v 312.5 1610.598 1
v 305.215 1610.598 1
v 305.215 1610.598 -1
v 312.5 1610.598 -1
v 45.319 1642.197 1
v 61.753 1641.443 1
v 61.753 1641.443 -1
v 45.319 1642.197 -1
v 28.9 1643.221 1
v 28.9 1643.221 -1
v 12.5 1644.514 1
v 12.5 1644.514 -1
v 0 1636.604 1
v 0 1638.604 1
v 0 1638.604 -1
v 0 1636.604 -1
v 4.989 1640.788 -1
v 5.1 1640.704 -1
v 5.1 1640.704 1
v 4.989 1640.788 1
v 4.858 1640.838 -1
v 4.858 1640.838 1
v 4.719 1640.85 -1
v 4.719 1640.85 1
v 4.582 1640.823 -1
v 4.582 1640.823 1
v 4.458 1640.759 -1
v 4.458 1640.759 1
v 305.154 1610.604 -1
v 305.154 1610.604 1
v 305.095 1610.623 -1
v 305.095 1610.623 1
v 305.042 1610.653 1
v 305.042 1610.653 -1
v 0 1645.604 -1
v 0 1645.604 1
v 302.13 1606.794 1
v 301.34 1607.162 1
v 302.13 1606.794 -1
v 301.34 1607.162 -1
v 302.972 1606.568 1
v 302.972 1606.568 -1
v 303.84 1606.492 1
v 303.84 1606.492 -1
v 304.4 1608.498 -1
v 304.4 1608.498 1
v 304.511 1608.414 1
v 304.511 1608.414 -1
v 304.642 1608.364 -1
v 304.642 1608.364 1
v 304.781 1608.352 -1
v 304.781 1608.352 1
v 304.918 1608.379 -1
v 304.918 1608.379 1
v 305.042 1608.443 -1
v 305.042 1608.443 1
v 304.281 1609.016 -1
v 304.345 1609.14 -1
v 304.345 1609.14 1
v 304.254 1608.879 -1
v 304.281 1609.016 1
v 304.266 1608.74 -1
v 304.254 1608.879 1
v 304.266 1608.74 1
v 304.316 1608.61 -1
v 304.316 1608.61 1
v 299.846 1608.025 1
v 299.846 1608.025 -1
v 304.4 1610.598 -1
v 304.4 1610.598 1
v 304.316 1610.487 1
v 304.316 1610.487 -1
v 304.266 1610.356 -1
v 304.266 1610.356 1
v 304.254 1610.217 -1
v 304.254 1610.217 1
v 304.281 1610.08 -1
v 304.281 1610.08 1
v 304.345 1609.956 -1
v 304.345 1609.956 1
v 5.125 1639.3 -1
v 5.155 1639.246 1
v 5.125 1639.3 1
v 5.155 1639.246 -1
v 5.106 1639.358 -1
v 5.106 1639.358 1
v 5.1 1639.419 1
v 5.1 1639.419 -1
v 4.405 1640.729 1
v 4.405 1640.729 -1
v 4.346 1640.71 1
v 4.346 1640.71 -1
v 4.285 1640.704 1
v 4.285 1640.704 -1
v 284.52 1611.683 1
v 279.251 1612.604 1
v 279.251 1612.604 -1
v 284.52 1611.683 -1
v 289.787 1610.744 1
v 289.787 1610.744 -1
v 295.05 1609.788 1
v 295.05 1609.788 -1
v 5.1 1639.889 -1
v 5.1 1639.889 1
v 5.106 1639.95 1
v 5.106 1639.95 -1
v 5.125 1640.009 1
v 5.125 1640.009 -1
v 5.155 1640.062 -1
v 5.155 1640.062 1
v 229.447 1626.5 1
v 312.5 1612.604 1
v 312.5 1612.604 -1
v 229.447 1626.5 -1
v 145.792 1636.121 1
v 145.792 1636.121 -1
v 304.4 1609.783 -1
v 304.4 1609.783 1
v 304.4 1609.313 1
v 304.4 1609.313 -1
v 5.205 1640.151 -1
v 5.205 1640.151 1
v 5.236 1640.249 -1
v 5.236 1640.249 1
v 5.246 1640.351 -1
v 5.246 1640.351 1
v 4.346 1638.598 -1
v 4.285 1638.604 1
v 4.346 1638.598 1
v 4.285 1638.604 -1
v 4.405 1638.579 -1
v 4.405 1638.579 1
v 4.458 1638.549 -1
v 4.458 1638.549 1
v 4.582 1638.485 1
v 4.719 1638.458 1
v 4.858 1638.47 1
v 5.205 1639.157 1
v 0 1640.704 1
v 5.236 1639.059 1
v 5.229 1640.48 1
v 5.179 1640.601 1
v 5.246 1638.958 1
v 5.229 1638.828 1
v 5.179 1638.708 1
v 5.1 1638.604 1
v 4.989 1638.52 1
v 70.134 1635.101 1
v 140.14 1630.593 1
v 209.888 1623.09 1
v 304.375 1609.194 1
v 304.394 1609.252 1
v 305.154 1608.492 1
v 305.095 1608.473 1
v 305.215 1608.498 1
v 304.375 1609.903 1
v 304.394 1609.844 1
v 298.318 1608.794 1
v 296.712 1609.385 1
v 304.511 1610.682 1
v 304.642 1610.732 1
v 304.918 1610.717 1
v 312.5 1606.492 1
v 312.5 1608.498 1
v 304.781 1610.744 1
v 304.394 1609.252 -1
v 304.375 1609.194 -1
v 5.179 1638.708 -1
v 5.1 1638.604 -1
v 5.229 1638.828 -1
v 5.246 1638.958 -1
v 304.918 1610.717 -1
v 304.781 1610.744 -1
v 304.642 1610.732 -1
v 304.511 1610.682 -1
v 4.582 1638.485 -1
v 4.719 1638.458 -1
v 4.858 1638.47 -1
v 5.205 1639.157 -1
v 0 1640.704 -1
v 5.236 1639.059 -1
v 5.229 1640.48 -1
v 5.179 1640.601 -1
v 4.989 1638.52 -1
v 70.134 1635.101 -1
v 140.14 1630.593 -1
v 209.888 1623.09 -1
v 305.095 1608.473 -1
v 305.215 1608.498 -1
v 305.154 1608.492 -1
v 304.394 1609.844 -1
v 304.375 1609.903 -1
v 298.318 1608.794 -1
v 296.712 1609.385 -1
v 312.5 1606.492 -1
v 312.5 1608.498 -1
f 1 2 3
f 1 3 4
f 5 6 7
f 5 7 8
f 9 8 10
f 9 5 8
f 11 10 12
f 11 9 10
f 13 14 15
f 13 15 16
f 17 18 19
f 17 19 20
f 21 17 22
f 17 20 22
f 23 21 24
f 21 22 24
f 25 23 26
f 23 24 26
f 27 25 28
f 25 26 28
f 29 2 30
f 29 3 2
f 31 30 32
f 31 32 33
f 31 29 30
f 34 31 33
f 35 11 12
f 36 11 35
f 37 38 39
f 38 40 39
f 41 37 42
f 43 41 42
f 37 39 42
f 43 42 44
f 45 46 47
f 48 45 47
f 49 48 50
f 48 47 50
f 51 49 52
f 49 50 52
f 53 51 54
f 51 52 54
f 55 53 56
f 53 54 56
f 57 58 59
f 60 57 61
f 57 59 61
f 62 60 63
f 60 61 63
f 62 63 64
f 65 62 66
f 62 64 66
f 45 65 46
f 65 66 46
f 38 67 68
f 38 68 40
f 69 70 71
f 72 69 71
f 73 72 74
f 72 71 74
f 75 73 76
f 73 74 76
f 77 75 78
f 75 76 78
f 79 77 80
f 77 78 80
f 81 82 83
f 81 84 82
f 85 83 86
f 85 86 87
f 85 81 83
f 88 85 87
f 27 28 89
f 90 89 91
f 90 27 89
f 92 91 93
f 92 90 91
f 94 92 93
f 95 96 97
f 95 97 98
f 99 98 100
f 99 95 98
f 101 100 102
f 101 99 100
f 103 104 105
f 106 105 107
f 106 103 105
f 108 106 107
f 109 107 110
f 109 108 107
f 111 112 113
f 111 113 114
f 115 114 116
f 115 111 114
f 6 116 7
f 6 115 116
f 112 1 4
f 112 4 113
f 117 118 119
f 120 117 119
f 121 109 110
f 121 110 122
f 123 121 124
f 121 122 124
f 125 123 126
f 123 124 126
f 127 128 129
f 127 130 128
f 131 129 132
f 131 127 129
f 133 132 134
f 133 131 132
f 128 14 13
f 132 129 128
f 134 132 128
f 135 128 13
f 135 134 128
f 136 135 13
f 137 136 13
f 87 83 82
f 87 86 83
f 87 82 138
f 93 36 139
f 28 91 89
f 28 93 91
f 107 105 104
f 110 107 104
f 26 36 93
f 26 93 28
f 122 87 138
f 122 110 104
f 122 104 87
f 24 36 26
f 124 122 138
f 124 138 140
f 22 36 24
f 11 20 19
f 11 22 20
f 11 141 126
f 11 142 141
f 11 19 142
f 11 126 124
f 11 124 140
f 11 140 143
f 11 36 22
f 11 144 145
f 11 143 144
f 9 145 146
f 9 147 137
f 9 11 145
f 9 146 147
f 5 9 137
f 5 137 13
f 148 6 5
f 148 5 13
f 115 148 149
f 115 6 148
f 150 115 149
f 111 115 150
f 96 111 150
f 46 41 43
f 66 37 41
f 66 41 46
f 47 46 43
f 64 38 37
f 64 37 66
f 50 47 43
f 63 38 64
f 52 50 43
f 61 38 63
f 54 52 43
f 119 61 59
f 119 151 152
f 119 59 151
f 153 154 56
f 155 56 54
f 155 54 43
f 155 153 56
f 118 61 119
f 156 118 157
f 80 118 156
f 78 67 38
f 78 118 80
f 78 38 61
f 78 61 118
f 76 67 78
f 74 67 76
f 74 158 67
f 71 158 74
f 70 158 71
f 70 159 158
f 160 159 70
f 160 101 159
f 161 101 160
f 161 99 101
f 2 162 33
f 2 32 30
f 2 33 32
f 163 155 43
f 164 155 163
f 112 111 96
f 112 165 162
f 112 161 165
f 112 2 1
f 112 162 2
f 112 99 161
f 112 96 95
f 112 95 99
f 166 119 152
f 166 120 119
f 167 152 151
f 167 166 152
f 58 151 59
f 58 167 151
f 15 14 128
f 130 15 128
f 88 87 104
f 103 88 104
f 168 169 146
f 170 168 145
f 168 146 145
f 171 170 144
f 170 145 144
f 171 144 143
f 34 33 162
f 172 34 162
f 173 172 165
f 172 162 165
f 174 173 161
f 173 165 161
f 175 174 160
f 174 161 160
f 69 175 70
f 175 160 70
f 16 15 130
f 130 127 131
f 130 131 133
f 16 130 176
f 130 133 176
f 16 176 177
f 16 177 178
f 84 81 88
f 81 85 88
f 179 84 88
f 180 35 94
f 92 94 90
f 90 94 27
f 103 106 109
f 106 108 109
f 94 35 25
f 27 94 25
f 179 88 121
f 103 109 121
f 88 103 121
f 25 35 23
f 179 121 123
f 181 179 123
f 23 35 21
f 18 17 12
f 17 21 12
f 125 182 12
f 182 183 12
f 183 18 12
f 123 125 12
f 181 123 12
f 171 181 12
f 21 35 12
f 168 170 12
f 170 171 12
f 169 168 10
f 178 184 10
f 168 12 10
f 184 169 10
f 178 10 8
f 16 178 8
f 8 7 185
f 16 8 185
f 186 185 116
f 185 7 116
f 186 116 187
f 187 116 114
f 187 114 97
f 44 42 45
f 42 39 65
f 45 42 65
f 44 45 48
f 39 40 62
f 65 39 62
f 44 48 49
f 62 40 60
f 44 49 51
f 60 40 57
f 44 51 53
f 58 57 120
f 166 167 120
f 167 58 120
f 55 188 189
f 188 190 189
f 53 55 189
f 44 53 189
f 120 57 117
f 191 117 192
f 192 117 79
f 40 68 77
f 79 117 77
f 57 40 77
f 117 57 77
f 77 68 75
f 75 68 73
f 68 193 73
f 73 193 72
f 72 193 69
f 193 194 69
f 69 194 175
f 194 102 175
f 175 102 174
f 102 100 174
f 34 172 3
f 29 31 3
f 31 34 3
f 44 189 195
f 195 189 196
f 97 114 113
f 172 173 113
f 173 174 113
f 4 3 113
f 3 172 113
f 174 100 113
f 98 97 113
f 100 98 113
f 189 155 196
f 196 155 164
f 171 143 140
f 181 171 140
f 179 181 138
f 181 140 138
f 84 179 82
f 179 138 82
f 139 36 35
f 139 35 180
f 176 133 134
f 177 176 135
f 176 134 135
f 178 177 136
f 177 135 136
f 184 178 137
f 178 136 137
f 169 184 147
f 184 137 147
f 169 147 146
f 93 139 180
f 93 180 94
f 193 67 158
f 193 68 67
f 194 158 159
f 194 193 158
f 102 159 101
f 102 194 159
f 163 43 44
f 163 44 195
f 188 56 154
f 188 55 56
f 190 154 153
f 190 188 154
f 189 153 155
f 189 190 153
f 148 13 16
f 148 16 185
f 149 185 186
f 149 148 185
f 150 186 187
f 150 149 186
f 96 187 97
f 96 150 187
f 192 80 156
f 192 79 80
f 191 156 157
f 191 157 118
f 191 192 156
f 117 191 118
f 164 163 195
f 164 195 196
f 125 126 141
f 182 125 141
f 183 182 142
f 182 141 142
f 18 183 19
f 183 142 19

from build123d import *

# Parameters (mm, degrees)
EXTRUDE_1_DEPTH     = 1
EXTRUDE_2_DEPTH     = 2
SKETCH_2_3_W        = 8.1
SKETCH_2_3_H        = 1.05
CUT_EXTRUDE_1_DEPTH = 1673.067193133
EXTRUDE_3_DEPTH     = 2
FILLET_1_R          = 1000
SKETCH_4_W          = 5.1
SKETCH_4_H          = 2.1
CUT_EXTRUDE_2_DEPTH = 1676.014424819
CUT_EXTRUDE_3_DEPTH = 10
FILLET_2_R          = 0.3
FILLET_3_R          = 15
FILLET_4_R          = 5


with BuildPart() as part:
    # 草图1 → 凸台-拉伸1 (new, symmetric)
    with BuildSketch(Plane.XY):
        with BuildLine():
            Line((279.250783347, 1612.604166667), (312.5, 1612.604166667))
            ThreePointArc((312.5, 1612.604166667), (156.96834872, 1635.086965837), (0, 1642.604166667))
            Line((0, 1642.604166667), (0, 1636.604166667))
            ThreePointArc((0, 1636.604166667), (140.140108463, 1630.593127776), (279.250783347, 1612.604166667))
        make_face()
        with BuildLine():
            ThreePointArc((279.250783347, 1612.604166667), (295.891173678, 1609.633999296), (312.5, 1606.492125207))
            Line((312.5, 1606.492125207), (312.5, 1612.604166667))
            Line((312.5, 1612.604166667), (279.250783347, 1612.604166667))
        make_face()
    extrude(amount=EXTRUDE_1_DEPTH, both=True)

    # 草图2 → 凸台-拉伸2 (add)
    with BuildSketch(Plane.XY.offset(1)):
        with BuildLine():
            Line((304.4, 1608.498145937), (304.4, 1609.548145937))
            Line((304.4, 1609.548145937), (304.4, 1610.598145937))
            Line((304.4, 1610.598145937), (297.605619779, 1609.317896945))
            ThreePointArc((297.605619779, 1609.317896945), (305.056081841, 1607.922257226), (312.5, 1606.492125207))
            Line((312.5, 1606.492125207), (312.5, 1608.498145937))
            Line((312.5, 1608.498145937), (304.4, 1608.498145937))
        make_face()
        with BuildLine():
            Line((302.5, 1606.492125207), (312.5, 1606.492125207))
            ThreePointArc((312.5, 1606.492125207), (305.056081841, 1607.922257226), (297.605619779, 1609.317896945))
            Line((297.605619779, 1609.317896945), (302.5, 1606.492125207))
        make_face()
    extrude(amount=-EXTRUDE_2_DEPTH)

    # 草图2<3> → 切除-拉伸1 (cut, through all)
    with BuildSketch(Plane.XY.offset(1)):
        with Locations((308.45, 1610.073145937)):
            Rectangle(SKETCH_2_3_W, SKETCH_2_3_H)
        with Locations((308.45, 1609.023145937)):
            Rectangle(SKETCH_2_3_W, SKETCH_2_3_H)
    extrude(amount=-CUT_EXTRUDE_1_DEPTH, mode=Mode.SUBTRACT)

    # 草图3 → 凸台-拉伸3 (add)
    with BuildSketch(Plane.XY.offset(1)):
        with BuildLine():
            Line((0, 1645.604166667), (0, 1642.604166667))
            ThreePointArc((0, 1642.604166667), (20.001482883, 1642.482386217), (40, 1642.117062925))
            Line((40, 1642.117062925), (0, 1645.604166667))
        make_face()
    extrude(amount=-EXTRUDE_3_DEPTH)

    # 圆角1
    # the kernel refuses this fillet: 1000 mm, written as the material it adds along each edge
    with BuildSketch(Plane(origin=(40, 1642.117062925, 1), x_dir=(-0.9962215569396788, 0.08684819795874989, 0), z_dir=(0, 0, -1))) as fillet_1_piece_1:
        with BuildLine():
            CenterArc((27.604593051, 1000), FILLET_1_R, 267.172213378, 2.827786622)
            ThreePointArc((-21.729560043, 1.217670692), (-10.862763311, 0.644823912), (0, 0))
            Line((0, 0), (27.604593051, 0))
        make_face()
    extrude(amount=2)

    # 草图4 → 切除-拉伸2 (cut, through all)
    with BuildSketch(Plane.XY.offset(1)):
        with Locations((2.55, 1639.654166667)):
            Rectangle(SKETCH_4_W, SKETCH_4_H)
    extrude(amount=-CUT_EXTRUDE_2_DEPTH, mode=Mode.SUBTRACT)

    # 草图5 → 切除-拉伸3 (cut)
    with BuildSketch(Plane.XY.offset(1)):
        with BuildLine():
            Line((304.4, 1608.498145937), (304.4, 1609.205252718))
            ThreePointArc((304.4, 1609.205252718), (304.253553391, 1608.851699327), (304.4, 1608.498145937))
        make_face()
        with BuildLine():
            Line((305.107106781, 1608.498145937), (304.4, 1608.498145937))
            ThreePointArc((304.4, 1608.498145937), (304.753553391, 1608.351699327), (305.107106781, 1608.498145937))
        make_face()
        with BuildLine():
            ThreePointArc((304.4, 1610.598145937), (304.253553391, 1610.244592546), (304.4, 1609.891039155))
            Line((304.4, 1609.891039155), (304.4, 1610.598145937))
        make_face()
        with BuildLine():
            Line((304.4, 1610.598145937), (305.107106781, 1610.598145937))
            ThreePointArc((305.107106781, 1610.598145937), (304.753553391, 1610.744592546), (304.4, 1610.598145937))
        make_face()
        with BuildLine():
            ThreePointArc((5.1, 1639.997059885), (5.208386376, 1640.15927156), (5.246446609, 1640.350613276))
            ThreePointArc((5.246446609, 1640.350613276), (5.208386376, 1640.541954992), (5.1, 1640.704166667))
            Line((5.1, 1640.704166667), (5.1, 1639.997059885))
        make_face()
        with BuildLine():
            Line((4.392893219, 1640.704166667), (5.1, 1640.704166667))
            ThreePointArc((5.1, 1640.704166667), (4.746446609, 1640.850613276), (4.392893219, 1640.704166667))
        make_face()
        with BuildLine():
            ThreePointArc((5.246446609, 1638.957720057), (5.208386376, 1639.149061773), (5.1, 1639.311273448))
            Line((5.1, 1639.311273448), (5.1, 1638.604166667))
            ThreePointArc((5.1, 1638.604166667), (5.208386376, 1638.766378341), (5.246446609, 1638.957720057))
        make_face()
        with BuildLine():
            Line((5.1, 1638.604166667), (4.392893219, 1638.604166667))
            ThreePointArc((4.392893219, 1638.604166667), (4.746446609, 1638.457720057), (5.1, 1638.604166667))
        make_face()
    extrude(amount=-CUT_EXTRUDE_3_DEPTH, mode=Mode.SUBTRACT)

    # 圆角2
    fillet_2_edges = [part.edges().sort_by_distance(p)[0] for p in [
        (4.392893219, 1638.604166667, 0),
        (5.1, 1639.997059885, 0),
        (304.4, 1609.205252718, 0),
        (305.107106781, 1610.598145937, 0),
        (305.107106781, 1608.498145937, 0),
        (304.4, 1609.891039155, 0),
        (4.392893219, 1640.704166667, 0),
        (5.1, 1639.311273448, 0),
    ]]
    fillet(fillet_2_edges, radius=FILLET_2_R)

    # 圆角3
    fillet_3_edges = [part.edges().sort_by_distance(p)[0] for p in [
        (297.605619779, 1609.317896945, 0),
    ]]
    fillet(fillet_3_edges, radius=FILLET_3_R)

    # 圆角4
    fillet_4_edges = [part.edges().sort_by_distance(p)[0] for p in [
        (302.5, 1606.492125207, 0),
    ]]
    fillet(fillet_4_edges, radius=FILLET_4_R)


solid = part.part
